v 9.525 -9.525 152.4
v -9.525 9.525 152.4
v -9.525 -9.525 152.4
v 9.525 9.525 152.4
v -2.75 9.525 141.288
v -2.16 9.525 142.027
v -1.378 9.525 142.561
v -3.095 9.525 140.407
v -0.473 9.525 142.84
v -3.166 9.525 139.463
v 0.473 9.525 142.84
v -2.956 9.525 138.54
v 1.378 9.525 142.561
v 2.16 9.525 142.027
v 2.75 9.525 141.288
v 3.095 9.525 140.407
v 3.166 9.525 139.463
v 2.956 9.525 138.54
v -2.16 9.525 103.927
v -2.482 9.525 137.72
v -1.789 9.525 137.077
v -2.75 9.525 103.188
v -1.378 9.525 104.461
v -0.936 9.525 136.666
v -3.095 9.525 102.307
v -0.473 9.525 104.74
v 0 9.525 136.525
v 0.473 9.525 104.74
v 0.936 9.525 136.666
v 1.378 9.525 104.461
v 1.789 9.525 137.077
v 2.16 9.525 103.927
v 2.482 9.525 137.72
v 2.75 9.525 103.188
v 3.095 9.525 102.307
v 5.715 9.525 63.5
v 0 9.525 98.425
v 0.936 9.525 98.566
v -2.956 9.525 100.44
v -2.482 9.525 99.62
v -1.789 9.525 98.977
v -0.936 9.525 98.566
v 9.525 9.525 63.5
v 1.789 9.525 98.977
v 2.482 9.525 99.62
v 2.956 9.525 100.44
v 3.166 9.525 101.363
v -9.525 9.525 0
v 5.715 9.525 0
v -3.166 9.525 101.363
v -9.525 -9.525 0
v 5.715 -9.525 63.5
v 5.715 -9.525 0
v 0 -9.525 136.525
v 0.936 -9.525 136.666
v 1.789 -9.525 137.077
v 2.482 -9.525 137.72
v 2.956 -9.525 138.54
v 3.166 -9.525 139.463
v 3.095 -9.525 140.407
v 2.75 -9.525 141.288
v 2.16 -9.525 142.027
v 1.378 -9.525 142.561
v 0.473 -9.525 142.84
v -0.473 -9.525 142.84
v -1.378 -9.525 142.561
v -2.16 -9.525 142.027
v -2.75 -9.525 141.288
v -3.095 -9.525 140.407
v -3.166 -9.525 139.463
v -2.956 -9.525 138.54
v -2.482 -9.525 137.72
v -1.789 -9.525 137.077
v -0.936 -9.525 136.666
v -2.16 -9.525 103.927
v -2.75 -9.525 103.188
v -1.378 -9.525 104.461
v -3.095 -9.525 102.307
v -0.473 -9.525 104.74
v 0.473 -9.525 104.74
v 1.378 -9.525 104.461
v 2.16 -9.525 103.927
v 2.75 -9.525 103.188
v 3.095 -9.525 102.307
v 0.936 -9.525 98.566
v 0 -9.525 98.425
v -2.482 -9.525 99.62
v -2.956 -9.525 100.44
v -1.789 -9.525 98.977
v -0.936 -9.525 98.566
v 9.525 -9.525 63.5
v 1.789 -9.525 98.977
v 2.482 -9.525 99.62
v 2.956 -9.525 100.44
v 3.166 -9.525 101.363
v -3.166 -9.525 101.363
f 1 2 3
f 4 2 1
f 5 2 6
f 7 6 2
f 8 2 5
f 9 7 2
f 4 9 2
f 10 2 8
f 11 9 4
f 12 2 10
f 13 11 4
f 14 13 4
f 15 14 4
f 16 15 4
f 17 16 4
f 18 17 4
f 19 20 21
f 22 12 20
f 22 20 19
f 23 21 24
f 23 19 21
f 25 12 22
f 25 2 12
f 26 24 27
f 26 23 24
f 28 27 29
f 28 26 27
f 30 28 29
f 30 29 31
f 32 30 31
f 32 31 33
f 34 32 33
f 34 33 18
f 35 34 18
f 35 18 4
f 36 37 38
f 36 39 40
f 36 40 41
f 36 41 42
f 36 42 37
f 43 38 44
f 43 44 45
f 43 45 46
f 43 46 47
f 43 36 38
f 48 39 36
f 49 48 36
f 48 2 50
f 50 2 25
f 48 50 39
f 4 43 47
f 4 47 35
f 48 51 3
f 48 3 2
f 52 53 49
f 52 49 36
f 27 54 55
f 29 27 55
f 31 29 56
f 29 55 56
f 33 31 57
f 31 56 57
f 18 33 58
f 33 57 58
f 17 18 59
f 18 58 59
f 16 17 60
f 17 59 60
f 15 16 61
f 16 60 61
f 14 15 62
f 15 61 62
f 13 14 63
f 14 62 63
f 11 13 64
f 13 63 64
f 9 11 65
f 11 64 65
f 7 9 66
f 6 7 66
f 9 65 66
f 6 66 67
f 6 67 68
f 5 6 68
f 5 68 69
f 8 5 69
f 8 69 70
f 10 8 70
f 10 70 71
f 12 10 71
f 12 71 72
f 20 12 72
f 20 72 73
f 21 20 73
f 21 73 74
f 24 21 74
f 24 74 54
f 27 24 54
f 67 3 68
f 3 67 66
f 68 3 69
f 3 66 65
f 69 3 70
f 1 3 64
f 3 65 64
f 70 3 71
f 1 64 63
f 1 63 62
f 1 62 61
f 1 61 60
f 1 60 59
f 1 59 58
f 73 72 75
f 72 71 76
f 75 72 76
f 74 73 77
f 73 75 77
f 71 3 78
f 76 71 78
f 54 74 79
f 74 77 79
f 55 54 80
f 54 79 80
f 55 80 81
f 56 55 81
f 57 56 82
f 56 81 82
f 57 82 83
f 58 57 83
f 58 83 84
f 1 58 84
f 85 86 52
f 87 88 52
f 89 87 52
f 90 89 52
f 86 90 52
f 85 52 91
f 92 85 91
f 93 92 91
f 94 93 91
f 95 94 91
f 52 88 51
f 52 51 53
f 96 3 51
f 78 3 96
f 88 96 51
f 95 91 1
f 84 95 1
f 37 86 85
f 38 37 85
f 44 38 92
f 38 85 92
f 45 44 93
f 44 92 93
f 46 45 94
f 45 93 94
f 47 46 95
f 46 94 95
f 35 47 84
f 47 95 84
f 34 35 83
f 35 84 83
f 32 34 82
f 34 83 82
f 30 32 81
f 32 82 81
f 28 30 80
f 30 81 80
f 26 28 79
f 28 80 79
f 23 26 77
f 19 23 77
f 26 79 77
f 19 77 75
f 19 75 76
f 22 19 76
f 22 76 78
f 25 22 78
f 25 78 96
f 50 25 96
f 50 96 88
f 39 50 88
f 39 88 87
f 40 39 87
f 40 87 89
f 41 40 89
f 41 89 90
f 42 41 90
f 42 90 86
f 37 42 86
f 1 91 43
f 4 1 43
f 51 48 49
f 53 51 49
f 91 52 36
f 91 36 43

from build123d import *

# Parameters (mm, degrees)
SKETCH1_W           = 19.05
SKETCH1_H           = 19.05
BOSS_EXTRUDE1_DEPTH = 152.4
SKETCH3_R           = 3.175
SKETCH3_W           = 3.81
SKETCH3_H           = 63.5
CUT_EXTRUDE1_DEPTH  = 25.4


with BuildPart() as part:
    # Sketch1 → Boss-Extrude1 (new body)
    with BuildSketch(Plane.XY):
        Rectangle(SKETCH1_W, SKETCH1_H)
    extrude(amount=BOSS_EXTRUDE1_DEPTH)

    # Sketch3 → Cut-Extrude1 (cut)
    with BuildSketch(Plane.XZ.offset(9.525)):
        with Locations(Location((0, 139.7, 0), (0, 0, 270))):
            Circle(SKETCH3_R)
        with Locations(Location((0, 101.6, 0), (0, 0, 270))):
            Circle(SKETCH3_R)
        with Locations((7.62, 31.75)):
            Rectangle(SKETCH3_W, SKETCH3_H)
    extrude(amount=-CUT_EXTRUDE1_DEPTH, mode=Mode.SUBTRACT)


solid = part.part
